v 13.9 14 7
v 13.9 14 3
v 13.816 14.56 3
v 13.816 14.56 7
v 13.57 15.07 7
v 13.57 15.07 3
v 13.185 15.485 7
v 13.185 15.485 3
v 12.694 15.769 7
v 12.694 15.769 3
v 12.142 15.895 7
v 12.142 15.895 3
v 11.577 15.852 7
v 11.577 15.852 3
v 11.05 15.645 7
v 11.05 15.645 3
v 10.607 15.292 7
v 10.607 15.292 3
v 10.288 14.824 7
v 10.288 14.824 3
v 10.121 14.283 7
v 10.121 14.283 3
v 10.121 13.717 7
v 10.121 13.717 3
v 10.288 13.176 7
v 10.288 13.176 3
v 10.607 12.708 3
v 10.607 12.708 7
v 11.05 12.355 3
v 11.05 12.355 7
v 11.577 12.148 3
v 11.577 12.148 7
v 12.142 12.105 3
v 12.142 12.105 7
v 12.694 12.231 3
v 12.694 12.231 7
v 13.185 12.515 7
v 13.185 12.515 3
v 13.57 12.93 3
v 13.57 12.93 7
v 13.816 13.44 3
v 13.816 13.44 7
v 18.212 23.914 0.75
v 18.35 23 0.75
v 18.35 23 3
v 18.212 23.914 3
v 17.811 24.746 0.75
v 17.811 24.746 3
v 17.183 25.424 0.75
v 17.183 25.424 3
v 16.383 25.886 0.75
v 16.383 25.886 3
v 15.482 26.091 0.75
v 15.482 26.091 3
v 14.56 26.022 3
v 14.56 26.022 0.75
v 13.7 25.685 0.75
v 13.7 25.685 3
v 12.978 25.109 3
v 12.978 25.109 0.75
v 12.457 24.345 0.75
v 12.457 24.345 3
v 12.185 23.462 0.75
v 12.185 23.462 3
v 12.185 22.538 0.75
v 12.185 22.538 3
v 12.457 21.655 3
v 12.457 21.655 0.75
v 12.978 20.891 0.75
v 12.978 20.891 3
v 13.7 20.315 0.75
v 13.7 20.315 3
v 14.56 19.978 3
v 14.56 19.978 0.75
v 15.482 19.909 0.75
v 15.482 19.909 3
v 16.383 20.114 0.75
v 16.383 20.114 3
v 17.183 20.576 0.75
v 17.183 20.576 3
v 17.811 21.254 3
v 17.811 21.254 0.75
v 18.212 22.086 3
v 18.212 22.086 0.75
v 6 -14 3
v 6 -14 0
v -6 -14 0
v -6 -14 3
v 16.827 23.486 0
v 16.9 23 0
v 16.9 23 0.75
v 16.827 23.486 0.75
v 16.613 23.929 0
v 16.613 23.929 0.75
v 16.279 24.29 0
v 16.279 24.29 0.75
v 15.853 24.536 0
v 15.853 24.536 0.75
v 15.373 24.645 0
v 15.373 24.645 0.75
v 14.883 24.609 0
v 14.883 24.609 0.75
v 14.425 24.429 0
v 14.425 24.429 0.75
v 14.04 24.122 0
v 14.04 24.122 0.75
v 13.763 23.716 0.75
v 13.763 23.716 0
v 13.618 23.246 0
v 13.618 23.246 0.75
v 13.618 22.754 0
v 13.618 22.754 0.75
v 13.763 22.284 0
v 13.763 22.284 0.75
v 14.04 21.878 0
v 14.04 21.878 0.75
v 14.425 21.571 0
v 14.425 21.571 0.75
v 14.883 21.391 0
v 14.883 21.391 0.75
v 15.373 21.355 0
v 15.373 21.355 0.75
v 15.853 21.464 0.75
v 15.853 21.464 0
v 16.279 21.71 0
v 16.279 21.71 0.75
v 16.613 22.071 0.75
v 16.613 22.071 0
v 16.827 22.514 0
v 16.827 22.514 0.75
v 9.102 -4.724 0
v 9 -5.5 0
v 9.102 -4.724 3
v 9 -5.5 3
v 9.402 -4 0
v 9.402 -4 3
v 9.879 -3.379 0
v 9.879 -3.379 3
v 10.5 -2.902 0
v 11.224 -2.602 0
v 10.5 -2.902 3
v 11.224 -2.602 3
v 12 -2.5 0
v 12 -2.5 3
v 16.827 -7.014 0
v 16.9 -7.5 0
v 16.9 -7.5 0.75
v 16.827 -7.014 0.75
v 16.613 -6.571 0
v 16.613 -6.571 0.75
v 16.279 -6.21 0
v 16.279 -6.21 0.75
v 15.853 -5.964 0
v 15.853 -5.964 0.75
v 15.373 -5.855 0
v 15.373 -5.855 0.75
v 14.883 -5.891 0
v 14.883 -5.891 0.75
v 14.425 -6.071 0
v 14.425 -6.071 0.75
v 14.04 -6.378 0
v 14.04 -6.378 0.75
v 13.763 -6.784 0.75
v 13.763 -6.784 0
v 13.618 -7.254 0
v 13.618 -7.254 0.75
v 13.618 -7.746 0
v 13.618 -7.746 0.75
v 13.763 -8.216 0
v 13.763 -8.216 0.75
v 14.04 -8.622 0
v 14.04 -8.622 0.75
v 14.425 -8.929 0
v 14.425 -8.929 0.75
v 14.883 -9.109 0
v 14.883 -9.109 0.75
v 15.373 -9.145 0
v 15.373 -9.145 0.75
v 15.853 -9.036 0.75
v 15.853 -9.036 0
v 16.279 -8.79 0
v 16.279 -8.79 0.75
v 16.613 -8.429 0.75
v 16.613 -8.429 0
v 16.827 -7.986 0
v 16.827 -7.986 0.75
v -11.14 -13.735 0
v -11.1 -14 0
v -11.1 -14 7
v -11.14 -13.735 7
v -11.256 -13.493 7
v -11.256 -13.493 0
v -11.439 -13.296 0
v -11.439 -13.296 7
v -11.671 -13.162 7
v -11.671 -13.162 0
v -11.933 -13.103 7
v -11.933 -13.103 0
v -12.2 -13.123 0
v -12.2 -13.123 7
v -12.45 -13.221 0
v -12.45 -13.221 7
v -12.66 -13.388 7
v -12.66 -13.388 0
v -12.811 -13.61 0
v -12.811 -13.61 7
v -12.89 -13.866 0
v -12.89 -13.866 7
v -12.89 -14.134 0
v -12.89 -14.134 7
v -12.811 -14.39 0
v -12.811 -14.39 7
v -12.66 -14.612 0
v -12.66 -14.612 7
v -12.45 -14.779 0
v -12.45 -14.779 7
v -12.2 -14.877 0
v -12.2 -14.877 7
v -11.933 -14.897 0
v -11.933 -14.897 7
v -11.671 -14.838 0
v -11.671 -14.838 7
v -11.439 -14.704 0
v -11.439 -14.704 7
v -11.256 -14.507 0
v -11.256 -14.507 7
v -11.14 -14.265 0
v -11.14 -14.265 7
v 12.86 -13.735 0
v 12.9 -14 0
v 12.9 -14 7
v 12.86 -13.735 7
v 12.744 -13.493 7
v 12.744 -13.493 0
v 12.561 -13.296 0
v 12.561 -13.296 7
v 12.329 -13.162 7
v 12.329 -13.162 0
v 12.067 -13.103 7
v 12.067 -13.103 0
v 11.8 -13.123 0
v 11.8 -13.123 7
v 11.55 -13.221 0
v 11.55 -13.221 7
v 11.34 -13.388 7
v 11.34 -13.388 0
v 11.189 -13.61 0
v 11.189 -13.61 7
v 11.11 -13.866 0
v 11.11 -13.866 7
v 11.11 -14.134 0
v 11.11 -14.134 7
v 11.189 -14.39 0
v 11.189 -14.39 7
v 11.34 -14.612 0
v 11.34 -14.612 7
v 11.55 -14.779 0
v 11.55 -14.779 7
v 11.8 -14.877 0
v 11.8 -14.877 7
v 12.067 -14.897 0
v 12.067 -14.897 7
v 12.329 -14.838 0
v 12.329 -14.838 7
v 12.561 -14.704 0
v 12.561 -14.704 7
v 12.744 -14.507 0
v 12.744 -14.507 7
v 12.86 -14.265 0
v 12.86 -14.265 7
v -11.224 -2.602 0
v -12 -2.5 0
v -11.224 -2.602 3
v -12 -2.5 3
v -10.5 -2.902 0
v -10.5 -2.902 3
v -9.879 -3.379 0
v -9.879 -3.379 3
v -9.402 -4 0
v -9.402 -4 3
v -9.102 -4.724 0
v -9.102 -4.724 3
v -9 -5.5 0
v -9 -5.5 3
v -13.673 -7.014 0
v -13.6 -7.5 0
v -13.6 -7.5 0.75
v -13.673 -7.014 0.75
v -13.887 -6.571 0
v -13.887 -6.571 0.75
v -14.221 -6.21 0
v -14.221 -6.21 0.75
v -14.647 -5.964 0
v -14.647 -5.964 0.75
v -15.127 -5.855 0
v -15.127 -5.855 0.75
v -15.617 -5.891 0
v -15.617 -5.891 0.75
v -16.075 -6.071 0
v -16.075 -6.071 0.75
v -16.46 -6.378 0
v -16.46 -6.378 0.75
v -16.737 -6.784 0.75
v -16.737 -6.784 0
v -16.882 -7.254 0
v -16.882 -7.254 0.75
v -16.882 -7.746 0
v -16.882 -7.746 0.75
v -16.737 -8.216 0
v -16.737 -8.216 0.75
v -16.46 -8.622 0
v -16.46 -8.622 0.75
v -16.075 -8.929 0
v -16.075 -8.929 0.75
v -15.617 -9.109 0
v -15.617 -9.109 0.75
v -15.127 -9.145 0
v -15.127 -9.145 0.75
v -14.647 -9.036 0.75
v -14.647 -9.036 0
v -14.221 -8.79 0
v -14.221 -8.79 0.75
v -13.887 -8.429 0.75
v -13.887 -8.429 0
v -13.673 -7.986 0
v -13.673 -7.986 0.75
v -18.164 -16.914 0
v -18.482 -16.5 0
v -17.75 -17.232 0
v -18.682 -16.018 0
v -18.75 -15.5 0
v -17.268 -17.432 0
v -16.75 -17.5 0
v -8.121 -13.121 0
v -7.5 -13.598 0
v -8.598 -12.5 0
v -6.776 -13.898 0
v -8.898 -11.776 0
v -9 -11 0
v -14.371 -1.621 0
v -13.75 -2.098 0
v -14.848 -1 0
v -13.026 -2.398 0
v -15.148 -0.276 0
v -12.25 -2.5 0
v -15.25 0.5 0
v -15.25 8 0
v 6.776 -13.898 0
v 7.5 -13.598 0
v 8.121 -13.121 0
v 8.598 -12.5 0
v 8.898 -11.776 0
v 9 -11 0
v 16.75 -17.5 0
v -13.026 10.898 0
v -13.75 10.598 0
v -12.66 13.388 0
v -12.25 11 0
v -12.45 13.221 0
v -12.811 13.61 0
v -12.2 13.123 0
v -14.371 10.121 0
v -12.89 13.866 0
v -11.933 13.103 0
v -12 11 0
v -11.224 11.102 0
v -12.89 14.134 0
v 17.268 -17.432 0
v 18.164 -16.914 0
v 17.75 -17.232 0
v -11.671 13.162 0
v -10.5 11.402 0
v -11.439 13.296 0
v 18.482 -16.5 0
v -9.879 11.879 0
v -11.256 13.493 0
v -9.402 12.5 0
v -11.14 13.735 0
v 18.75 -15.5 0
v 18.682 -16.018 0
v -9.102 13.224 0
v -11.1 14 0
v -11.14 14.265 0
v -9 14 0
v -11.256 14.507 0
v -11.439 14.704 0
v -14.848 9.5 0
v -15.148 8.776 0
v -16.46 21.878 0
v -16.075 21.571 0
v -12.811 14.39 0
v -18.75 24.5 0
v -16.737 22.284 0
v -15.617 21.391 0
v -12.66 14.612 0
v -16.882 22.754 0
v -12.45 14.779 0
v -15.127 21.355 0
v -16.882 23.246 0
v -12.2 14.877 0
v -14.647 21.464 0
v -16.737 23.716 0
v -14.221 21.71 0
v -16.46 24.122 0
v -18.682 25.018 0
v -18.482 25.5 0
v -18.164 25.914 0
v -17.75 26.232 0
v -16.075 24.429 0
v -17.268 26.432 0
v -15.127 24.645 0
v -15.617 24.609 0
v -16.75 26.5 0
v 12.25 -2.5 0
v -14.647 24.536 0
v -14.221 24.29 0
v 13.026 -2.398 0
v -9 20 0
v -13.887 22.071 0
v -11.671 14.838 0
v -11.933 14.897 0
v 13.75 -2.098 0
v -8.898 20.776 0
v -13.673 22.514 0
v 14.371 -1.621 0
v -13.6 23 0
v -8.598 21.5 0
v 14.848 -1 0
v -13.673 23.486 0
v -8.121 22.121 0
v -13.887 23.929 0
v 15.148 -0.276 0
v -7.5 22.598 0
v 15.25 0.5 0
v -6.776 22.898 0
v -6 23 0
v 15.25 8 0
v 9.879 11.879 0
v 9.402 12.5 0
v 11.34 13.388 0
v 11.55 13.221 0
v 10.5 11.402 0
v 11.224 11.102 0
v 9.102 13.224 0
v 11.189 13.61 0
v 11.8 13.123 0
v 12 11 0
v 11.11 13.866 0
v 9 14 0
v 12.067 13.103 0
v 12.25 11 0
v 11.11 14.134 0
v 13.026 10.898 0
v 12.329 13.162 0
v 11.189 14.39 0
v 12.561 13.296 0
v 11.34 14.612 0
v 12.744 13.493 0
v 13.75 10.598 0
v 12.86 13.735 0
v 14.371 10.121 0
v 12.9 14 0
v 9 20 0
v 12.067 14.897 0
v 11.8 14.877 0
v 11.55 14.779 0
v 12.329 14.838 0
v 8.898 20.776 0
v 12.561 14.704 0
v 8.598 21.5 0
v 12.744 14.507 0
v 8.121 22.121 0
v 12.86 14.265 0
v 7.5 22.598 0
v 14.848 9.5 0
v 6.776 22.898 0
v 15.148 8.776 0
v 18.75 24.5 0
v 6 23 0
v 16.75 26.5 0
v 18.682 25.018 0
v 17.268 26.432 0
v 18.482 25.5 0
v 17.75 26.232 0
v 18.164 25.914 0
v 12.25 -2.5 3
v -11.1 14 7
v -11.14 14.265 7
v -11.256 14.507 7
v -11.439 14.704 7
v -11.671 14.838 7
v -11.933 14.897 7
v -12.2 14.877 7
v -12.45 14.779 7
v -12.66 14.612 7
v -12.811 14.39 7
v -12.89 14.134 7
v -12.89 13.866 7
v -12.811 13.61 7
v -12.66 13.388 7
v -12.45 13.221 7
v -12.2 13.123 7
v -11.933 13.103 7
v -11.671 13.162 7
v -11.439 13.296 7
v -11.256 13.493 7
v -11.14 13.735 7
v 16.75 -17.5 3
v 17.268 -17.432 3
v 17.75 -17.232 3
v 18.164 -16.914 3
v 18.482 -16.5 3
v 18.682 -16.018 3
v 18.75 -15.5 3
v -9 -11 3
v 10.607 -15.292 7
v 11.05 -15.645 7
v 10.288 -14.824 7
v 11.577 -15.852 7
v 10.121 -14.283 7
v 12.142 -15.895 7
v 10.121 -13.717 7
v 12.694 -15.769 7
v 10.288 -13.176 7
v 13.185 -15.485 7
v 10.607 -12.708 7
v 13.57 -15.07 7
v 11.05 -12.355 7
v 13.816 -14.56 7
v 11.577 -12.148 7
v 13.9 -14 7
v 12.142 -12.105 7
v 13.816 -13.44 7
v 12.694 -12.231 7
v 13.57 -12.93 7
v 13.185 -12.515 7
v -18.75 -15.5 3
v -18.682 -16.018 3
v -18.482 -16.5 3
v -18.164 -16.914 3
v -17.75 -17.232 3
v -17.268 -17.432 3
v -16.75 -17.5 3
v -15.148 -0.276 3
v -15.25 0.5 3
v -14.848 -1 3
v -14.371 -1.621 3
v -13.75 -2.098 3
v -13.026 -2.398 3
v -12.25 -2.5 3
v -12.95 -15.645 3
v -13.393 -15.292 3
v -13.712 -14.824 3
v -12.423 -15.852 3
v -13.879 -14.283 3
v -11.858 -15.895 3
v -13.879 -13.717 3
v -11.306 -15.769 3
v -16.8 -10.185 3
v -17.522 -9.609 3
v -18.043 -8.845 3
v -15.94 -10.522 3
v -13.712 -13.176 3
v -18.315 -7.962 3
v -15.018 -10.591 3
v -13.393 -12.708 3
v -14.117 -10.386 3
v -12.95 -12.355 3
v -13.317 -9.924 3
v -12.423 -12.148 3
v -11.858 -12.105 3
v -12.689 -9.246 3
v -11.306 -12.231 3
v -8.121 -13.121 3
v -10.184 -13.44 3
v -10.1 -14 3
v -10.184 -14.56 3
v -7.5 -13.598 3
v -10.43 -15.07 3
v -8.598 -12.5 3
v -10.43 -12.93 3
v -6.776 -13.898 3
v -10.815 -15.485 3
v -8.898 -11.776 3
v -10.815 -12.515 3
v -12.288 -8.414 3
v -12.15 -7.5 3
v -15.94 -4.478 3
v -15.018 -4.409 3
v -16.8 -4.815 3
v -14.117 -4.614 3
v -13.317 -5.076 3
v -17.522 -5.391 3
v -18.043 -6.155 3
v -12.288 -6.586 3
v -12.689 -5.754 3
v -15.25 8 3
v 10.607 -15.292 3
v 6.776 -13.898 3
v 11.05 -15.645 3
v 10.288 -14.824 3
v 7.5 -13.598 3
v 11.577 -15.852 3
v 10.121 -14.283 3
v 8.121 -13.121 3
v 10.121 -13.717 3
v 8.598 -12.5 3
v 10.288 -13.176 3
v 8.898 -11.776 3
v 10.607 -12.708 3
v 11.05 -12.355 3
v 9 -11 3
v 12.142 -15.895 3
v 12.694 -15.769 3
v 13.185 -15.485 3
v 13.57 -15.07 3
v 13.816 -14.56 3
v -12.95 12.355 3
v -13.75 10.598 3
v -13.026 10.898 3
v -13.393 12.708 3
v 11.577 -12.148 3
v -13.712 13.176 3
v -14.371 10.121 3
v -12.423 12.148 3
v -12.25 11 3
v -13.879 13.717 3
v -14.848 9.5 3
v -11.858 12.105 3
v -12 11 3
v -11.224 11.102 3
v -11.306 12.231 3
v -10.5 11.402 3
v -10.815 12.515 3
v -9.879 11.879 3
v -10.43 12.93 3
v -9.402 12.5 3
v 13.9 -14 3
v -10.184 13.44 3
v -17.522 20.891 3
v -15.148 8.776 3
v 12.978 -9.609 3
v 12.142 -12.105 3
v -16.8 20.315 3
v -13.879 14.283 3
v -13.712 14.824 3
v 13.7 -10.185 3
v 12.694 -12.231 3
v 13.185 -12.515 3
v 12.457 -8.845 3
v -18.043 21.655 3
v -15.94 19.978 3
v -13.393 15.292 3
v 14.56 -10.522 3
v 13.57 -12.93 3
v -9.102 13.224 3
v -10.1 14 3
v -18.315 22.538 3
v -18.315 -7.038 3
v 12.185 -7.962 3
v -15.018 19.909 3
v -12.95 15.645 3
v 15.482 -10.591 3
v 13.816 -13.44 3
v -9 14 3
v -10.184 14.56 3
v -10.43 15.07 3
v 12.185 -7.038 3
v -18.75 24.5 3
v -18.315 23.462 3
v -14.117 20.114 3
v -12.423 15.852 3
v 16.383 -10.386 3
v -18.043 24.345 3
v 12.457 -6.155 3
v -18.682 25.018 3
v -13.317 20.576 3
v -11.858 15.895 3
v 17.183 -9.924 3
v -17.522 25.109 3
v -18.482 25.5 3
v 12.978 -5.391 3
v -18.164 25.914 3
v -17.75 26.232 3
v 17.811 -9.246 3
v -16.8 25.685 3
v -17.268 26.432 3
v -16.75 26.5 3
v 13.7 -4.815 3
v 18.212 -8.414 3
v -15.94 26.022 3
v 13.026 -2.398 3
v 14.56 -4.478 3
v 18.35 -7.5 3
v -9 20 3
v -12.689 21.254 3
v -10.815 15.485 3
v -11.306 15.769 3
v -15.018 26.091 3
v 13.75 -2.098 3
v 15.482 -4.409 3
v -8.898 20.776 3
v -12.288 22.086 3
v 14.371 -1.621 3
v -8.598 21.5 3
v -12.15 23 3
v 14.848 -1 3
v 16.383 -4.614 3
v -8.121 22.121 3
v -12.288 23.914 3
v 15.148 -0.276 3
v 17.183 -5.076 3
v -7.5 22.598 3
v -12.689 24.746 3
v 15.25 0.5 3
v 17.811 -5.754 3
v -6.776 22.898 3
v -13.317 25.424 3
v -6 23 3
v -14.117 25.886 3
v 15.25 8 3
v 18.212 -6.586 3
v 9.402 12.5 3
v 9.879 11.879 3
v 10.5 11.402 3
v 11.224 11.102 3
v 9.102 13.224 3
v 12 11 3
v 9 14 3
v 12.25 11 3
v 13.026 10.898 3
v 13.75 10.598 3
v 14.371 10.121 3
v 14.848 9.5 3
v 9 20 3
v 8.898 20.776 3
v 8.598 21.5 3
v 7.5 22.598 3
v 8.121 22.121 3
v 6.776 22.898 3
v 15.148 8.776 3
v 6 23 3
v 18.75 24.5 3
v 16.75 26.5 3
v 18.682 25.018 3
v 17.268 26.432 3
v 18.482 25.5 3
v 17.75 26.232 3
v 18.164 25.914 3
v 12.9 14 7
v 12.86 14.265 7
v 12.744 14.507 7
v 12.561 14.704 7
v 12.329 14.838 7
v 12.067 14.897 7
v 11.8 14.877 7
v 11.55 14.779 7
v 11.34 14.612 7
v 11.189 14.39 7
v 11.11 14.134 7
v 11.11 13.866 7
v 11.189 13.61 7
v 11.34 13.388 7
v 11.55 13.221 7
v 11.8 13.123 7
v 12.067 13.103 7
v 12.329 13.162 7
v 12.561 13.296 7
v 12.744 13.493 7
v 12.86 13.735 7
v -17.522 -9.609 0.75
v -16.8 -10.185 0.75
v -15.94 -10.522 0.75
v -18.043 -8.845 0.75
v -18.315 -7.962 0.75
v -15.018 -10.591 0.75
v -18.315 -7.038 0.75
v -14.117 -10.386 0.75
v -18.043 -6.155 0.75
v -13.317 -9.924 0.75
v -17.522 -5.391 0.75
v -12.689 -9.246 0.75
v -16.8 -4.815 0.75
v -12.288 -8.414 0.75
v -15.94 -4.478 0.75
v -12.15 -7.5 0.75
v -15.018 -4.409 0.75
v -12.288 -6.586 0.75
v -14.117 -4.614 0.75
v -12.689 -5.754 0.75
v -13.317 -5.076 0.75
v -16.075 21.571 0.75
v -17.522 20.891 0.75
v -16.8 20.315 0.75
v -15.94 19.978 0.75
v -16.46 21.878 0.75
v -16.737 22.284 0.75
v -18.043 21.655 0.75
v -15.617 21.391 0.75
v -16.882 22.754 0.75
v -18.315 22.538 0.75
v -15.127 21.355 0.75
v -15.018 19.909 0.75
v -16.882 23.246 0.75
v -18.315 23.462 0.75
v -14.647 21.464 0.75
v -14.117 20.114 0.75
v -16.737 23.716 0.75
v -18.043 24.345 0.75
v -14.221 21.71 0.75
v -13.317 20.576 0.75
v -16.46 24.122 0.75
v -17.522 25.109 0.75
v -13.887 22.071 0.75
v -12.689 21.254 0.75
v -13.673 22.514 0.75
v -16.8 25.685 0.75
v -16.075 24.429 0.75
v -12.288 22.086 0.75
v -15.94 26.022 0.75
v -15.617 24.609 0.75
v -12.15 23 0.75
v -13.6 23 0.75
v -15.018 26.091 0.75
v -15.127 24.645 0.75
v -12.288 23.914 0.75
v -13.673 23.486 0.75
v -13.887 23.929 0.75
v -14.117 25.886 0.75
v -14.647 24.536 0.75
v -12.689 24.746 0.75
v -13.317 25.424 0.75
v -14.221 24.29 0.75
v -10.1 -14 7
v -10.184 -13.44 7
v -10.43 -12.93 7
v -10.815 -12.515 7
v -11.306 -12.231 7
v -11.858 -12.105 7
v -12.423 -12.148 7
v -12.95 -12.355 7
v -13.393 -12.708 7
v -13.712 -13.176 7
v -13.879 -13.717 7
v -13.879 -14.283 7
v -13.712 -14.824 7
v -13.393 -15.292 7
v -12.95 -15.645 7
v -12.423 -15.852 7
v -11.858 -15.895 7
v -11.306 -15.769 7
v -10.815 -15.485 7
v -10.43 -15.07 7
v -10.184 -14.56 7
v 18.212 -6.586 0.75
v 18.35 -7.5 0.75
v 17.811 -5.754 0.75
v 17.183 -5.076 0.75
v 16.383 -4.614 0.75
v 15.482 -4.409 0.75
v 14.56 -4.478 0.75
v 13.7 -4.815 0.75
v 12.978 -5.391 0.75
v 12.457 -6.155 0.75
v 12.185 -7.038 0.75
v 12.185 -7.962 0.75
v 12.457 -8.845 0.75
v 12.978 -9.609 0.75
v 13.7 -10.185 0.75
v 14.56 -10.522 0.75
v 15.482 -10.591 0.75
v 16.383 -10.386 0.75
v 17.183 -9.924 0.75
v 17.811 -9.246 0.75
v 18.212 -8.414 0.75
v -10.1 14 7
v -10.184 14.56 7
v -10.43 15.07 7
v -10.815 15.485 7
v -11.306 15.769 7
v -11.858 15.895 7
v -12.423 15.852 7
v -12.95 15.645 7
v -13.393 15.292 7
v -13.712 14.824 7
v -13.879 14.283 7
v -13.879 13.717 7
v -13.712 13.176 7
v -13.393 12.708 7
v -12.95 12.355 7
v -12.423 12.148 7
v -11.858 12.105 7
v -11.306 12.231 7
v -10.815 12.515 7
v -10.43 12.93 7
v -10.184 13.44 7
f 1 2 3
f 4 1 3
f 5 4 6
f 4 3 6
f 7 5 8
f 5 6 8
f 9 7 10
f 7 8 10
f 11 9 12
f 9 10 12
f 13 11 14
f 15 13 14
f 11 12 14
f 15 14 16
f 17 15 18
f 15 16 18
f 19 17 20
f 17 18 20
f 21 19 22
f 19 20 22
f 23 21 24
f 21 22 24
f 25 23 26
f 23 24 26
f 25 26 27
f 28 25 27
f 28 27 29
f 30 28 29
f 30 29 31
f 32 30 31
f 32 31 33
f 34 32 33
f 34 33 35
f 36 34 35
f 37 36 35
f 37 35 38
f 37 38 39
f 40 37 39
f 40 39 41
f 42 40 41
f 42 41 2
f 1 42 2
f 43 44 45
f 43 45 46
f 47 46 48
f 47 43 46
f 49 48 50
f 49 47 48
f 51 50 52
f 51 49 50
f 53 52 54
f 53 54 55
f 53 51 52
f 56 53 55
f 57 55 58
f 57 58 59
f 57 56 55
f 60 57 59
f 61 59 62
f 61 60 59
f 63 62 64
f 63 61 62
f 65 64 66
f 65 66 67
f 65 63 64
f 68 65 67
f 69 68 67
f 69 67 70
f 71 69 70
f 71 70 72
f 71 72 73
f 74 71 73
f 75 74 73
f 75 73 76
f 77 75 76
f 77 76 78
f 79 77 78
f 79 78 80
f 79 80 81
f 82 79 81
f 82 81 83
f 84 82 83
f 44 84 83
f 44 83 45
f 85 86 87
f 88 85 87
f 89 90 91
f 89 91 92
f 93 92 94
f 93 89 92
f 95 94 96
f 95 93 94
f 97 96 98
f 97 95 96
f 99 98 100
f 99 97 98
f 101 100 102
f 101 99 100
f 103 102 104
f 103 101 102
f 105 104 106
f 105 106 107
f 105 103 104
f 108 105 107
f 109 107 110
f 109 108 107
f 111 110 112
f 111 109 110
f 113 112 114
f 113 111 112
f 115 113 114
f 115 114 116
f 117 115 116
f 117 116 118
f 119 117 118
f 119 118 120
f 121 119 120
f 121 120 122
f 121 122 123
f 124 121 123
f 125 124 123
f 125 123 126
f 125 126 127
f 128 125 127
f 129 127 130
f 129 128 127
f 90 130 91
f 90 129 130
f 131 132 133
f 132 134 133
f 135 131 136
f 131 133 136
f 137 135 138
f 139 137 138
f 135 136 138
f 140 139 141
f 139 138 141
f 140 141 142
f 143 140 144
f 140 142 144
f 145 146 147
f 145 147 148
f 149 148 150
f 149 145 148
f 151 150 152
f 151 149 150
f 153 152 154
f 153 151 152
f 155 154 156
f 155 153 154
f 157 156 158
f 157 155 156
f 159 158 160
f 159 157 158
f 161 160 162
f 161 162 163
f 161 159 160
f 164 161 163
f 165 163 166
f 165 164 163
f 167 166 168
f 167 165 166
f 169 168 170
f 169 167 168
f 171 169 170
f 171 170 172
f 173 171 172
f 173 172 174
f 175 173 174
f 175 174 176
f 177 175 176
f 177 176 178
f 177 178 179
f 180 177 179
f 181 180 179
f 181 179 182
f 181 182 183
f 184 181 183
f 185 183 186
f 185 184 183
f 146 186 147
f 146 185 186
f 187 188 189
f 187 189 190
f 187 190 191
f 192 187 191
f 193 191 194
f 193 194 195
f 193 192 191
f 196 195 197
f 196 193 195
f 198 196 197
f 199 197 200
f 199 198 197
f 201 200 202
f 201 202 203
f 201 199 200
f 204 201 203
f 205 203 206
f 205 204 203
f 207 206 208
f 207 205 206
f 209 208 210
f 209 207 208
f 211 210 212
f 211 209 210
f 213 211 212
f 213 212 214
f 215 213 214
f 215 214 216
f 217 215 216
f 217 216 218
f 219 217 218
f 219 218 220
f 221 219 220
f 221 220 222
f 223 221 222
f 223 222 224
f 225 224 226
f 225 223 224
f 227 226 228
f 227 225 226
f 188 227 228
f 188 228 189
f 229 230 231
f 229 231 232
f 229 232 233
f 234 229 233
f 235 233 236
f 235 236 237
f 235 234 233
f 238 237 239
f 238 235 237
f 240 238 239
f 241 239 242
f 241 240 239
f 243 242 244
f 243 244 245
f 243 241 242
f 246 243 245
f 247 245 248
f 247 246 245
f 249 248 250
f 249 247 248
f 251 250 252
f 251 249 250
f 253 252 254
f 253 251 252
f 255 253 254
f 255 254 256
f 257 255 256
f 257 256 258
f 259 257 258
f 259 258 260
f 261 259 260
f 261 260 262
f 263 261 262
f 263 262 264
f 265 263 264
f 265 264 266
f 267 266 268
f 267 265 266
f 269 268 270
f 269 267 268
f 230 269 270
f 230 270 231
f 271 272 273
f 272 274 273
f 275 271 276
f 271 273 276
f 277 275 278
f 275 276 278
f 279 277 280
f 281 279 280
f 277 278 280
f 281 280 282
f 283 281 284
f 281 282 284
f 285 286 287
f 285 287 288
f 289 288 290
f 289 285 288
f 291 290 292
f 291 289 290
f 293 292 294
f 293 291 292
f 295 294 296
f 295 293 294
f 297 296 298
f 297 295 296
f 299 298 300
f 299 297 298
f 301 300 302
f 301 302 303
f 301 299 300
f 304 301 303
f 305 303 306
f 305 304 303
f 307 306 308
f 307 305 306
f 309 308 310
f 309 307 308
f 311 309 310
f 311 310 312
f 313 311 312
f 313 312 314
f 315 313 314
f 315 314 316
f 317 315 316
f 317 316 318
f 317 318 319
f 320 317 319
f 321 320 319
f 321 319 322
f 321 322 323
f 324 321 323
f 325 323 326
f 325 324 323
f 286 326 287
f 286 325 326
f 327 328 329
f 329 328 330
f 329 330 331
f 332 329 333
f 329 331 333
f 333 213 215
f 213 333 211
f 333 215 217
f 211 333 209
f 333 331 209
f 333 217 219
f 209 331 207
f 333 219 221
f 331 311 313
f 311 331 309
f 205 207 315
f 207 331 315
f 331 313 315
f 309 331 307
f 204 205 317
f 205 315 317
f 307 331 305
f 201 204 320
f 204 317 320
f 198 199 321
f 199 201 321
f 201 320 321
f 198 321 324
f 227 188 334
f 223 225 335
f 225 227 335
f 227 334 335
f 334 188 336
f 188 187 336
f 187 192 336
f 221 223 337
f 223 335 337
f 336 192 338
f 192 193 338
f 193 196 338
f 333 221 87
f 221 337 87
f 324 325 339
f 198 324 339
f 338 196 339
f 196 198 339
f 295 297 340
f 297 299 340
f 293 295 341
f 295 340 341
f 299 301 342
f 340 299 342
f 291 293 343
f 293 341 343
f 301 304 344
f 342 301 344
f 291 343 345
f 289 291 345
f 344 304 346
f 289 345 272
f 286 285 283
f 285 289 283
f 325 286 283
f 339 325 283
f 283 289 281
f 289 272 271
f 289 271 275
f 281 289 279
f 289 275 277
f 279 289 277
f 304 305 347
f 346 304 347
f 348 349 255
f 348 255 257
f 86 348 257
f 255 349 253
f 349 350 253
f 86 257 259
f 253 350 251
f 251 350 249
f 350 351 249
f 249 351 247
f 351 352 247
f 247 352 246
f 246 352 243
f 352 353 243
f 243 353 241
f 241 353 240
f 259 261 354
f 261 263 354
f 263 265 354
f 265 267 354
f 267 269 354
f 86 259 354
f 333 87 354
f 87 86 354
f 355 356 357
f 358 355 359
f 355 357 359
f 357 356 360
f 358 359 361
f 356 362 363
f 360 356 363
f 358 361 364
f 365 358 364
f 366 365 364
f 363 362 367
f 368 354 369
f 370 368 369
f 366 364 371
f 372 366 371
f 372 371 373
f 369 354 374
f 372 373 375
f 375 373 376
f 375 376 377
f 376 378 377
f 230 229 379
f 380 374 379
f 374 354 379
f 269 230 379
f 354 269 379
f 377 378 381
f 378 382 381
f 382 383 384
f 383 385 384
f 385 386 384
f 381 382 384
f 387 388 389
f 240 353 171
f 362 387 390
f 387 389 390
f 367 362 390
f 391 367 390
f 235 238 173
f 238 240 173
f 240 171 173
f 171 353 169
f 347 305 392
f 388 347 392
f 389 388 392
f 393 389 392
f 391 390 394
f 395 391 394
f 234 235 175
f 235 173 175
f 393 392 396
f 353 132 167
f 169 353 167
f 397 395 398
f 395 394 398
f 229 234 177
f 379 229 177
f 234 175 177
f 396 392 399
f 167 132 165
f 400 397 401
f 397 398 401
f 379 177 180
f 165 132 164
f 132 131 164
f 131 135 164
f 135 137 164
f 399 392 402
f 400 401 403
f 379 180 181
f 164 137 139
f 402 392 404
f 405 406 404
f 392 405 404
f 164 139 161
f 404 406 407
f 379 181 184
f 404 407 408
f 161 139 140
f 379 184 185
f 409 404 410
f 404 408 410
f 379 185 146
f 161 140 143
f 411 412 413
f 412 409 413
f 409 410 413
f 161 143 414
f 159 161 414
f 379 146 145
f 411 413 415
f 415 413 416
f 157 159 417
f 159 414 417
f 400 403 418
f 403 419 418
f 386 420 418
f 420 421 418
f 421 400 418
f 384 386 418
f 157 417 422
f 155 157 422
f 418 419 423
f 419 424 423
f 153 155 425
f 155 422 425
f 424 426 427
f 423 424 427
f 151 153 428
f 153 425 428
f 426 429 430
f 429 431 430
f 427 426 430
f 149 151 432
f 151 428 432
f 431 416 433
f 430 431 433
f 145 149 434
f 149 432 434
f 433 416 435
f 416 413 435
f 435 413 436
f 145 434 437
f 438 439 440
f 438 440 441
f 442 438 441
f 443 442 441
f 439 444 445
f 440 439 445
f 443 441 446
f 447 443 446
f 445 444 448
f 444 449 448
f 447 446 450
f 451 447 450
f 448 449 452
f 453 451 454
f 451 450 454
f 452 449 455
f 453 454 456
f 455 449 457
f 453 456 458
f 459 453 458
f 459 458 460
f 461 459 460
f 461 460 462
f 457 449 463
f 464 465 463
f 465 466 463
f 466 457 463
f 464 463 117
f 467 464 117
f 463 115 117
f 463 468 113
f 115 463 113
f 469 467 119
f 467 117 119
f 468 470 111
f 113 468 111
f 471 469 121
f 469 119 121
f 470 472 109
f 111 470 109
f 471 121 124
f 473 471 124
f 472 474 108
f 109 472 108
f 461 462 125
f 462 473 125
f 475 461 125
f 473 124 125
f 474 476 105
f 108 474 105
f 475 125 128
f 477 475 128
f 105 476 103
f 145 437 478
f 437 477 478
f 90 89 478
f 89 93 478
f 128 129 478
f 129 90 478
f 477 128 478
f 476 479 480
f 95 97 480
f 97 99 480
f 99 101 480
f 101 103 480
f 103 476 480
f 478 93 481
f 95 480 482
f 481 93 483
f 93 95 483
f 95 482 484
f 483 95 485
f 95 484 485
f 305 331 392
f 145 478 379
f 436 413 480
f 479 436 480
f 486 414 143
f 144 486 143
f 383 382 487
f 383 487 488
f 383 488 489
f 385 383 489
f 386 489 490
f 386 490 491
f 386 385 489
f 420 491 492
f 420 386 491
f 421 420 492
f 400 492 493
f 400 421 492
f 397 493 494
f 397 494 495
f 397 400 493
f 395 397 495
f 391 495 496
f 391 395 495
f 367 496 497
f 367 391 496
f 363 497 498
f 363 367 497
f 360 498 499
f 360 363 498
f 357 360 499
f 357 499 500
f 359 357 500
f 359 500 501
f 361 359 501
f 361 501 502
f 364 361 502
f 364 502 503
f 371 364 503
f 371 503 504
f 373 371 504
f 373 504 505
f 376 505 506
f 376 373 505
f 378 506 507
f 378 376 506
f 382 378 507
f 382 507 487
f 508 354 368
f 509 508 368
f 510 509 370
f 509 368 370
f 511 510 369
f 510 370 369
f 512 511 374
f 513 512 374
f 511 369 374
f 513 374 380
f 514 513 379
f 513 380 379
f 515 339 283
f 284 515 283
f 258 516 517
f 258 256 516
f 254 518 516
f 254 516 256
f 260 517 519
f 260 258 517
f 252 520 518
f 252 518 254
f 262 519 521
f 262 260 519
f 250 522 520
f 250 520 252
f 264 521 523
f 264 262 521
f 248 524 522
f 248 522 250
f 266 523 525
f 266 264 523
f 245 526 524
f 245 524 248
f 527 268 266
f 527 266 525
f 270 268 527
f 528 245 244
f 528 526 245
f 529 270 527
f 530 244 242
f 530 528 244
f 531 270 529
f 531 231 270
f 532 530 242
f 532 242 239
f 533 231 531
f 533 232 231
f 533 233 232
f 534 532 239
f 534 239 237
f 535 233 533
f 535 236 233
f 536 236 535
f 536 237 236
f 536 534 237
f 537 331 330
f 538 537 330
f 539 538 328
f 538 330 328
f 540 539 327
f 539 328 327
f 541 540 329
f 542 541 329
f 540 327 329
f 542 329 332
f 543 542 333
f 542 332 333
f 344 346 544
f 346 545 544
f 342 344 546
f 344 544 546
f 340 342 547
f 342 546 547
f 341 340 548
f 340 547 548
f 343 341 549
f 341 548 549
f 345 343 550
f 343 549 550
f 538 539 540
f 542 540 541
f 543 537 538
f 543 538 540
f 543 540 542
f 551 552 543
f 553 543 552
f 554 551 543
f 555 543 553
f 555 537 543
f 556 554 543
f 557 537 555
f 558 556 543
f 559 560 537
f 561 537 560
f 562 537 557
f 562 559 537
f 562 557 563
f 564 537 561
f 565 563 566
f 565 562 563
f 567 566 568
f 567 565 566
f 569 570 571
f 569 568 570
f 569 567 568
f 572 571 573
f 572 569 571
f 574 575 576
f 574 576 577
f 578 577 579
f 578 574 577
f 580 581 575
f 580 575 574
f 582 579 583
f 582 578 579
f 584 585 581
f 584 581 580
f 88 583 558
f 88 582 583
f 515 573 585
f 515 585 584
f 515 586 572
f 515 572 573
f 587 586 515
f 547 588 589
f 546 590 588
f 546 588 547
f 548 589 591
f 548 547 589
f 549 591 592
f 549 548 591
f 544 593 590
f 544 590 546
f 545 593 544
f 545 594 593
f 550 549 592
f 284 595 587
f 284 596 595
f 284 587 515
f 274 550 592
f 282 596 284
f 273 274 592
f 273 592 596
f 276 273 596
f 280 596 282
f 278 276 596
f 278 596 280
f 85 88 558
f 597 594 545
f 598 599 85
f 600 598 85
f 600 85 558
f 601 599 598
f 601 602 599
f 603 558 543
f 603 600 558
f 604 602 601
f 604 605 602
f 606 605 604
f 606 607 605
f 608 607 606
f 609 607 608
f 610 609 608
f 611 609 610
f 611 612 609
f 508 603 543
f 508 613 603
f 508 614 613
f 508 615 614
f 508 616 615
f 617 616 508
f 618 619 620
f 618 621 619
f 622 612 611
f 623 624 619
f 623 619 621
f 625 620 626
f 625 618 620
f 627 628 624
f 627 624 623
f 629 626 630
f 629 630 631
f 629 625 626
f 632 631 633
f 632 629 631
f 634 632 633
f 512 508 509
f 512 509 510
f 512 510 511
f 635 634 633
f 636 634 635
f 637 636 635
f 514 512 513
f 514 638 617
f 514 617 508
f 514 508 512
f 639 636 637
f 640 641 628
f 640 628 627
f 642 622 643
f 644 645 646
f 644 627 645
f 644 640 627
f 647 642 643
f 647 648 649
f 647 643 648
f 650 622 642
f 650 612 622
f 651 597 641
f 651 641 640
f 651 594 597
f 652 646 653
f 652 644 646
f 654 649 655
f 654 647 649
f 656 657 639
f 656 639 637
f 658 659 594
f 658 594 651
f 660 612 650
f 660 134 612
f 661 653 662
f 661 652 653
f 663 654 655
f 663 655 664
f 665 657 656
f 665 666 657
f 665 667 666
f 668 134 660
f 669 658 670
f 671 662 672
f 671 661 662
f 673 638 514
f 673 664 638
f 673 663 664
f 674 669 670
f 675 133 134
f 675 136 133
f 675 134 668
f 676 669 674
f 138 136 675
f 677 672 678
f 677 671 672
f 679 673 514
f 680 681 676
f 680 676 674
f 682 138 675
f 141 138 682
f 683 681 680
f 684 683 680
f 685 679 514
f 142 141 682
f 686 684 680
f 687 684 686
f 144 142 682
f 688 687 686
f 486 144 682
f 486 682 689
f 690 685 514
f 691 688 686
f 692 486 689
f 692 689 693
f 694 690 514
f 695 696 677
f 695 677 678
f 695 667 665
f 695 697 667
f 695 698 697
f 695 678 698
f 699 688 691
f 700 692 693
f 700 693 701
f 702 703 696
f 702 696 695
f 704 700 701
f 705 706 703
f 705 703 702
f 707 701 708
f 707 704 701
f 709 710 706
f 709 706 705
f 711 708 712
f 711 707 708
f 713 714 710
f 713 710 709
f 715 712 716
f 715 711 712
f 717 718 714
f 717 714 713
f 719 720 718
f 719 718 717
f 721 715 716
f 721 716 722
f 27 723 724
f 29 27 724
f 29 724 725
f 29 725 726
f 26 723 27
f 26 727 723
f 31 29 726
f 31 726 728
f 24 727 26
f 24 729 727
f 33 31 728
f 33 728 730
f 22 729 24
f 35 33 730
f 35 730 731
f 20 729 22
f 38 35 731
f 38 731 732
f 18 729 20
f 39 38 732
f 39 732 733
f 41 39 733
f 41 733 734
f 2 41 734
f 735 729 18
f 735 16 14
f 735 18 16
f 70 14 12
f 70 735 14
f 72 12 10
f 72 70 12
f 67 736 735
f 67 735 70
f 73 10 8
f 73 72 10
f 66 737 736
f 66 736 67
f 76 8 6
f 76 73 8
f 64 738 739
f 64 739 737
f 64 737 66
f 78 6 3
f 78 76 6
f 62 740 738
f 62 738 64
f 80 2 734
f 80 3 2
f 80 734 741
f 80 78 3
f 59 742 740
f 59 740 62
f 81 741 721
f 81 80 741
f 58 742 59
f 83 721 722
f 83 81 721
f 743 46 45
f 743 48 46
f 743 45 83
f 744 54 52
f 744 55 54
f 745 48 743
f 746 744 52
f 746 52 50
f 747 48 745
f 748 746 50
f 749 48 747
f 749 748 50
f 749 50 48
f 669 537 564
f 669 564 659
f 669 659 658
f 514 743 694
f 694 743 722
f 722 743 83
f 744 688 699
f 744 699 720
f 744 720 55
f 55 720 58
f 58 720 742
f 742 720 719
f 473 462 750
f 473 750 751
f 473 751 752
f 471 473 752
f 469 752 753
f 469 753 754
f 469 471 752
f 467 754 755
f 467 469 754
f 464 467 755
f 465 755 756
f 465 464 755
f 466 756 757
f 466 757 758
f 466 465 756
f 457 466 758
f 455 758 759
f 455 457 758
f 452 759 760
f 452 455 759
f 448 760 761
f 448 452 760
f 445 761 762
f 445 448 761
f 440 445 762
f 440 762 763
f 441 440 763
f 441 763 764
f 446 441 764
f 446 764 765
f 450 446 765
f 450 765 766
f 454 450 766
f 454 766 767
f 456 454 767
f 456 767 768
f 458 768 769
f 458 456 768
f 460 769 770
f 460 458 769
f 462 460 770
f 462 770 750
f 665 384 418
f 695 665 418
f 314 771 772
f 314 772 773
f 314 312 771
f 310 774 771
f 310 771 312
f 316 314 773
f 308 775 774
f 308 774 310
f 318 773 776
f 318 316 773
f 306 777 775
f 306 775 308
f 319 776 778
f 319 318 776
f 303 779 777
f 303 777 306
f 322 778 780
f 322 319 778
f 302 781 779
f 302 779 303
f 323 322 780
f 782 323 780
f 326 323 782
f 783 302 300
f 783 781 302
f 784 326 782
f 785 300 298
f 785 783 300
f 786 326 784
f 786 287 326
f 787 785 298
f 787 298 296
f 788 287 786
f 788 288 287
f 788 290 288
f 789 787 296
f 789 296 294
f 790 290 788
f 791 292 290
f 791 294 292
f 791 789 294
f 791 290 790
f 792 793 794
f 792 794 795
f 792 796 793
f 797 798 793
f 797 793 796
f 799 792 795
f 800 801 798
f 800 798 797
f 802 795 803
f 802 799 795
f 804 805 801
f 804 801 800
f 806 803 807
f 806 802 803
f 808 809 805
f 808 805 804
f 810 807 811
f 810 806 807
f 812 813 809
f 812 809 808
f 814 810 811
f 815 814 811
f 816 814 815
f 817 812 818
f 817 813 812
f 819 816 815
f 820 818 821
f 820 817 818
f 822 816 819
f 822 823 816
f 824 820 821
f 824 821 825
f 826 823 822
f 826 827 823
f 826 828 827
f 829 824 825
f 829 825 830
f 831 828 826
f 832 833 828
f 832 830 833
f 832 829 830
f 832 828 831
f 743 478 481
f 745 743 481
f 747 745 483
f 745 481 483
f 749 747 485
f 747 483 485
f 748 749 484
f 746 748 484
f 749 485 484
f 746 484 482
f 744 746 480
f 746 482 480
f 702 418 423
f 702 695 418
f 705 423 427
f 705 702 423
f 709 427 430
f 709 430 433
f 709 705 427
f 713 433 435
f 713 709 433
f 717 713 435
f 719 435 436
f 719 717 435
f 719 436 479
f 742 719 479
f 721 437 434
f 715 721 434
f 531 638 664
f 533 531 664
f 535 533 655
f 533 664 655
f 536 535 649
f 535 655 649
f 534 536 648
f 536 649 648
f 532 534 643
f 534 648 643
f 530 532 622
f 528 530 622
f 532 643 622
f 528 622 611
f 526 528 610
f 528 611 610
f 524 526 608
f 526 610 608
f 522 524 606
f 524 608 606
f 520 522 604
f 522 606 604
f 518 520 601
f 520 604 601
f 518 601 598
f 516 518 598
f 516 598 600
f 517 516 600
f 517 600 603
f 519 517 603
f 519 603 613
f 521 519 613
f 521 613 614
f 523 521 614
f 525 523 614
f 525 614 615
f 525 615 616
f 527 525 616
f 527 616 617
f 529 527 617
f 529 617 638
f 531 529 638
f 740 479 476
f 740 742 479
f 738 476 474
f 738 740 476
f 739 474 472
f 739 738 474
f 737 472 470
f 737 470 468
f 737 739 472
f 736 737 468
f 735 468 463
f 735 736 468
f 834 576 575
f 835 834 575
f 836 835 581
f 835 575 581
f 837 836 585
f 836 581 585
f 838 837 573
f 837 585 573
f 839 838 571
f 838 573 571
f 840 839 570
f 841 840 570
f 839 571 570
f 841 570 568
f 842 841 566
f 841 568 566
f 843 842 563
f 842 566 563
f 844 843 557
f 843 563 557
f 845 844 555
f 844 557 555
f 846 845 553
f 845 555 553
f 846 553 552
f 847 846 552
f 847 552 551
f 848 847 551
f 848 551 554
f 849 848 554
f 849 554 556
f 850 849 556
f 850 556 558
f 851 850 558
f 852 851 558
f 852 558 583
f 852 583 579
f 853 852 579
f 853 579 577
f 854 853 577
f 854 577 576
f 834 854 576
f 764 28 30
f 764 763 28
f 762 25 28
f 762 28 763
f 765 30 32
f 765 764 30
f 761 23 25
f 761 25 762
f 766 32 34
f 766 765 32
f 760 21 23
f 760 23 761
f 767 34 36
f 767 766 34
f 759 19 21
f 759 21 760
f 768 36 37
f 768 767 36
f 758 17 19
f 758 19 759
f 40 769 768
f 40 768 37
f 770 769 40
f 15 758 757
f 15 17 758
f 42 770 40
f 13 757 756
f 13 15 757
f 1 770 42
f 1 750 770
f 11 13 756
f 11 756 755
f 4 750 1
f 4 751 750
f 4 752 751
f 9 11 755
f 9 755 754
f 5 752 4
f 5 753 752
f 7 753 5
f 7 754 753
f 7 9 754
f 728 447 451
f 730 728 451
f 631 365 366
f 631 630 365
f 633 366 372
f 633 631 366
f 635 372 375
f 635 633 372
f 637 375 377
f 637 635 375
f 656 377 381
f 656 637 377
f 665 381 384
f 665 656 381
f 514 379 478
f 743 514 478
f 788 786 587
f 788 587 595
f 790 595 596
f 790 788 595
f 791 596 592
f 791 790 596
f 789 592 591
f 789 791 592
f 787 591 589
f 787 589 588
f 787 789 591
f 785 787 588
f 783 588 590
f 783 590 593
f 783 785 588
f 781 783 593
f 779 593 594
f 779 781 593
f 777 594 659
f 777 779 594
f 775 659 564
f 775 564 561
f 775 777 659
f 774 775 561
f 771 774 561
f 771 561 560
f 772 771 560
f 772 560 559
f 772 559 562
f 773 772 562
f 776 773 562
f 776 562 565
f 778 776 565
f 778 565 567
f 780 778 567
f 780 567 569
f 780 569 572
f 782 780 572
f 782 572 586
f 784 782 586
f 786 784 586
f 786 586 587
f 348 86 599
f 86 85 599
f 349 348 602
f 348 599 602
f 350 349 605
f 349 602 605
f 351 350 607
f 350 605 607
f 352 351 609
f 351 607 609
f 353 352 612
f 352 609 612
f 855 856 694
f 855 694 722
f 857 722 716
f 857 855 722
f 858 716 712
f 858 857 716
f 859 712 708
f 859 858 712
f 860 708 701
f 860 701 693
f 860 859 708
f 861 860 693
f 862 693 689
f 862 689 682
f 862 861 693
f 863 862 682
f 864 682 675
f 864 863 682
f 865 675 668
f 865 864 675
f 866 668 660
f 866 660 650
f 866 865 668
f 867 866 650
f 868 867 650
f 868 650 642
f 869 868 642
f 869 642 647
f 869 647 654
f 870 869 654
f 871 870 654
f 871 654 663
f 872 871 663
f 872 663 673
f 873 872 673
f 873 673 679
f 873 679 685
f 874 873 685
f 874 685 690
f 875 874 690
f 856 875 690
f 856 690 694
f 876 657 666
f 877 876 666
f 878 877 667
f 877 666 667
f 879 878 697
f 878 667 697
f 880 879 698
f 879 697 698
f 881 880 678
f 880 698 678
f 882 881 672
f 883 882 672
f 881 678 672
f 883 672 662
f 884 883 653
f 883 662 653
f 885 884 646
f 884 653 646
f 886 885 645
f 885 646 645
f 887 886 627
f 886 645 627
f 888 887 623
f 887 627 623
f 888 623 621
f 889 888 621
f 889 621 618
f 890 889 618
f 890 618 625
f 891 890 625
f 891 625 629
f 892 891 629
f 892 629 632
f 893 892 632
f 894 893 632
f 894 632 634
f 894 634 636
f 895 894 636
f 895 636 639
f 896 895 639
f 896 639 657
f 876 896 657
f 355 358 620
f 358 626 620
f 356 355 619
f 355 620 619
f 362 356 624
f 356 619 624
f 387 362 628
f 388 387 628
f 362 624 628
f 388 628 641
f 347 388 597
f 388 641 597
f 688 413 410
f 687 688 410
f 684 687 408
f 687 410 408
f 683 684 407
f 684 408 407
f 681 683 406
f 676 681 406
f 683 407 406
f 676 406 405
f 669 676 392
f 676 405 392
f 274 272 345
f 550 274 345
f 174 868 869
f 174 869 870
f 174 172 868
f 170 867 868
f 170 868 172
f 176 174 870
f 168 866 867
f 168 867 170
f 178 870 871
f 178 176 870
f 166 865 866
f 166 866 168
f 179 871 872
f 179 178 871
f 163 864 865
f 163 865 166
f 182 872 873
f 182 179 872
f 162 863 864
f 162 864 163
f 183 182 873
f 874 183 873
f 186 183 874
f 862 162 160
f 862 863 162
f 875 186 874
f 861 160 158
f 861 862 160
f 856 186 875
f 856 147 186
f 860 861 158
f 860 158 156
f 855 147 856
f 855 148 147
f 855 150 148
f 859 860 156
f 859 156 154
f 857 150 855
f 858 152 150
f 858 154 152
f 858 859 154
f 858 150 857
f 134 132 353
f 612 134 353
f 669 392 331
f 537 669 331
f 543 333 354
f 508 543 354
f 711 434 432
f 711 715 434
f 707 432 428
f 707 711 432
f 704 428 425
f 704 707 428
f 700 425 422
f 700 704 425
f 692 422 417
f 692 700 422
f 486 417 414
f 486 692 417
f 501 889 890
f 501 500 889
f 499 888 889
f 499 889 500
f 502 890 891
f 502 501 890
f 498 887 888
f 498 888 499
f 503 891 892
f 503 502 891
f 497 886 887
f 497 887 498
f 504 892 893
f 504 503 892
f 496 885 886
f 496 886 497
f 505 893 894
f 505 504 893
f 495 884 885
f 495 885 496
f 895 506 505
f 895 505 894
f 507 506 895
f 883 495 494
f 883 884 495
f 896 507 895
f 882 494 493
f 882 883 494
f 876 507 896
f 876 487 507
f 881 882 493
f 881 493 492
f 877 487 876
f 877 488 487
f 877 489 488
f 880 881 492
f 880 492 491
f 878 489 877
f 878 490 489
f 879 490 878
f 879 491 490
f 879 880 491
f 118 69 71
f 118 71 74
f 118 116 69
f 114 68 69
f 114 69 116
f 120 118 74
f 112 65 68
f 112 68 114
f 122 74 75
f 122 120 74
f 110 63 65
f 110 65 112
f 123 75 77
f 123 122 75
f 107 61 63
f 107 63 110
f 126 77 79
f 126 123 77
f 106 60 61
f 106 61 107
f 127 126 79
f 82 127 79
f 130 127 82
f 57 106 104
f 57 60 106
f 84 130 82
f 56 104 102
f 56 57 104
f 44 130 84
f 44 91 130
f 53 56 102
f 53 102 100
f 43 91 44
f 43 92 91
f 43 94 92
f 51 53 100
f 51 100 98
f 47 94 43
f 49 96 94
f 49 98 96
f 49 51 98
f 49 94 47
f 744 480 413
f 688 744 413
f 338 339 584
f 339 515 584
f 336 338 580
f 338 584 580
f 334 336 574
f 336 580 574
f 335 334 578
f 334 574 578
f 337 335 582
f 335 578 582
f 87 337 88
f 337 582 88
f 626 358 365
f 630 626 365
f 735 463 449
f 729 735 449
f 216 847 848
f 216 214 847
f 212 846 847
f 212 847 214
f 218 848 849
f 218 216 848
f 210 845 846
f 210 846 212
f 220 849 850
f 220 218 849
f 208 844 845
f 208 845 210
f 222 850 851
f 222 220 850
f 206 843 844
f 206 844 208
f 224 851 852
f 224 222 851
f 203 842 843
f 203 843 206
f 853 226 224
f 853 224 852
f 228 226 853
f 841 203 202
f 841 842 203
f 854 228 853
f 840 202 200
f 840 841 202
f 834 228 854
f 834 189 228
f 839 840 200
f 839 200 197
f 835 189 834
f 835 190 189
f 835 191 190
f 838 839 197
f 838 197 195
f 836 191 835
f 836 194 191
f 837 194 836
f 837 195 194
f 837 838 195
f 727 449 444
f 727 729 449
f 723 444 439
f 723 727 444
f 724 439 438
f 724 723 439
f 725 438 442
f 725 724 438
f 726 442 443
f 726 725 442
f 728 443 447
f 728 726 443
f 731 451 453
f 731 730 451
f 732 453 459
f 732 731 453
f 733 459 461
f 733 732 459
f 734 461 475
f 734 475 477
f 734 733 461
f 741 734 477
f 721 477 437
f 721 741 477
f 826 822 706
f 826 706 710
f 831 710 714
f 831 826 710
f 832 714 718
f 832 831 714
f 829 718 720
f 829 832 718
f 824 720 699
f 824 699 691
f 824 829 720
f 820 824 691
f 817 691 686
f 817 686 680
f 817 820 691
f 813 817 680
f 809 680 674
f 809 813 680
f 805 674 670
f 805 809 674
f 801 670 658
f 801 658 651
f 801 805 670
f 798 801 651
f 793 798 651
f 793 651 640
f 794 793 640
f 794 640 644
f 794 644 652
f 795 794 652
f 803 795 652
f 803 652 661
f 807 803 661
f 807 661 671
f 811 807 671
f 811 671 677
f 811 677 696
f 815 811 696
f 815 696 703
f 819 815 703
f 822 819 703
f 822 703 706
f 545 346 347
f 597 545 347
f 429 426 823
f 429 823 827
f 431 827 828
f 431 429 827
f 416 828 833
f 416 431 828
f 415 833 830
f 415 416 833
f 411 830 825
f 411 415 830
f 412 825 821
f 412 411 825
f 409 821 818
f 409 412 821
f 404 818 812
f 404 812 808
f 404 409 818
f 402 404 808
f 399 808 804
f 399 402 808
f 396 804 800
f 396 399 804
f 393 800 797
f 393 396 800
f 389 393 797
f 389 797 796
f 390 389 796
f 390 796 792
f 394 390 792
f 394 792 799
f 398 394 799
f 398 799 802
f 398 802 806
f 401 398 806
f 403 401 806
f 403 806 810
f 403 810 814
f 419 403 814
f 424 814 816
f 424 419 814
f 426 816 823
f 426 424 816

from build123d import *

# Parameters (mm, degrees)
F0_R     = 1.9
F0_R_2   = 3.1
F1_DEPTH = 3
F0_R_3   = 1.65
F2_DEPTH = 0.75
F0_R_4   = 0.9
F3_DEPTH = 7
F4_R     = 3


with BuildPart() as f1:
    # F0 (on Top) → F1 (new body)
    with BuildSketch(Plane.XY):
        with BuildLine():
            ThreePointArc((-16.75, 26.5), (-18.164214, 25.914214), (-18.75, 24.5))
            Line((-18.75, 24.5), (-18.75, -15.5))
            ThreePointArc((-18.75, -15.5), (-18.164214, -16.914214), (-16.75, -17.5))
            Line((-16.75, -17.5), (16.75, -17.5))
            ThreePointArc((16.75, -17.5), (18.164214, -16.914214), (18.75, -15.5))
            Line((18.75, -15.5), (18.75, 24.5))
            ThreePointArc((18.75, 24.5), (18.164214, 25.914214), (16.75, 26.5))
            Line((16.75, 26.5), (-16.75, 26.5))
        make_face()
        with Locations((-12, -14)):
            Circle(F0_R, mode=Mode.SUBTRACT)
        with Locations((-15.25, -7.5)):
            Circle(F0_R_2, mode=Mode.SUBTRACT)
        with Locations((12, -14)):
            Circle(F0_R, mode=Mode.SUBTRACT)
        with Locations((15.25, -7.5)):
            Circle(F0_R_2, mode=Mode.SUBTRACT)
        with Locations((-12, 14)):
            Circle(F0_R, mode=Mode.SUBTRACT)
        with Locations((-15.25, 23)):
            Circle(F0_R_2, mode=Mode.SUBTRACT)
        Polygon((-9, 11), (-9, 14), (-9, 23), (9, 23), (9, 14), (9, 11), (15.25, 11), (15.25, -2.5), (9.75, -2.5), (9, -2.5), (9, -14), (-9, -14), (-9, -2.5), (-9.75, -2.5), (-15.25, -2.5), (-15.25, 11), align=None, mode=Mode.SUBTRACT)
        with Locations((12, 14)):
            Circle(F0_R, mode=Mode.SUBTRACT)
        with Locations((15.25, 23)):
            Circle(F0_R_2, mode=Mode.SUBTRACT)
    extrude(amount=F1_DEPTH)

    # F0 (on Top) → F2 (join)
    with BuildSketch(Plane.XY):
        with Locations((-15.25, 23)):
            Circle(F0_R_2)
        with Locations((-15.25, 23)):
            Circle(F0_R_3, mode=Mode.SUBTRACT)
        with Locations((15.25, 23)):
            Circle(F0_R_2)
        with Locations((15.25, 23)):
            Circle(F0_R_3, mode=Mode.SUBTRACT)
        with Locations((15.25, -7.5)):
            Circle(F0_R_2)
        with Locations((15.25, -7.5)):
            Circle(F0_R_3, mode=Mode.SUBTRACT)
        with Locations((-15.25, -7.5)):
            Circle(F0_R_2)
        with Locations((-15.25, -7.5)):
            Circle(F0_R_3, mode=Mode.SUBTRACT)
    extrude(amount=F2_DEPTH)

    # F0 (on Top) → F3 (join)
    with BuildSketch(Plane.XY):
        with Locations((-12, 14)):
            Circle(F0_R)
        with Locations((-12, 14)):
            Circle(F0_R_4, mode=Mode.SUBTRACT)
        with Locations((12, 14)):
            Circle(F0_R)
        with Locations((12, 14)):
            Circle(F0_R_4, mode=Mode.SUBTRACT)
        with Locations((12, -14)):
            Circle(F0_R)
        with Locations((12, -14)):
            Circle(F0_R_4, mode=Mode.SUBTRACT)
        with Locations((-12, -14)):
            Circle(F0_R)
        with Locations((-12, -14)):
            Circle(F0_R_4, mode=Mode.SUBTRACT)
    extrude(amount=F3_DEPTH)

    # F4
    f4_edges = [f1.edges().sort_by_distance(p)[0] for p in [
        (-15.25, 11, 1.5),
        (-9, 23, 1.5),
        (-9, 11, 1.5),
        (9, 23, 1.5),
        (9, 11, 1.5),
        (15.25, 11, 1.5),
        (15.25, -2.5, 1.5),
        (9, -2.5, 1.5),
        (9, -14, 1.5),
        (-9, -2.5, 1.5),
        (-9, -14, 1.5),
        (-15.25, -2.5, 1.5),
    ]]
    fillet(f4_edges, radius=F4_R)


solid = f1.part
